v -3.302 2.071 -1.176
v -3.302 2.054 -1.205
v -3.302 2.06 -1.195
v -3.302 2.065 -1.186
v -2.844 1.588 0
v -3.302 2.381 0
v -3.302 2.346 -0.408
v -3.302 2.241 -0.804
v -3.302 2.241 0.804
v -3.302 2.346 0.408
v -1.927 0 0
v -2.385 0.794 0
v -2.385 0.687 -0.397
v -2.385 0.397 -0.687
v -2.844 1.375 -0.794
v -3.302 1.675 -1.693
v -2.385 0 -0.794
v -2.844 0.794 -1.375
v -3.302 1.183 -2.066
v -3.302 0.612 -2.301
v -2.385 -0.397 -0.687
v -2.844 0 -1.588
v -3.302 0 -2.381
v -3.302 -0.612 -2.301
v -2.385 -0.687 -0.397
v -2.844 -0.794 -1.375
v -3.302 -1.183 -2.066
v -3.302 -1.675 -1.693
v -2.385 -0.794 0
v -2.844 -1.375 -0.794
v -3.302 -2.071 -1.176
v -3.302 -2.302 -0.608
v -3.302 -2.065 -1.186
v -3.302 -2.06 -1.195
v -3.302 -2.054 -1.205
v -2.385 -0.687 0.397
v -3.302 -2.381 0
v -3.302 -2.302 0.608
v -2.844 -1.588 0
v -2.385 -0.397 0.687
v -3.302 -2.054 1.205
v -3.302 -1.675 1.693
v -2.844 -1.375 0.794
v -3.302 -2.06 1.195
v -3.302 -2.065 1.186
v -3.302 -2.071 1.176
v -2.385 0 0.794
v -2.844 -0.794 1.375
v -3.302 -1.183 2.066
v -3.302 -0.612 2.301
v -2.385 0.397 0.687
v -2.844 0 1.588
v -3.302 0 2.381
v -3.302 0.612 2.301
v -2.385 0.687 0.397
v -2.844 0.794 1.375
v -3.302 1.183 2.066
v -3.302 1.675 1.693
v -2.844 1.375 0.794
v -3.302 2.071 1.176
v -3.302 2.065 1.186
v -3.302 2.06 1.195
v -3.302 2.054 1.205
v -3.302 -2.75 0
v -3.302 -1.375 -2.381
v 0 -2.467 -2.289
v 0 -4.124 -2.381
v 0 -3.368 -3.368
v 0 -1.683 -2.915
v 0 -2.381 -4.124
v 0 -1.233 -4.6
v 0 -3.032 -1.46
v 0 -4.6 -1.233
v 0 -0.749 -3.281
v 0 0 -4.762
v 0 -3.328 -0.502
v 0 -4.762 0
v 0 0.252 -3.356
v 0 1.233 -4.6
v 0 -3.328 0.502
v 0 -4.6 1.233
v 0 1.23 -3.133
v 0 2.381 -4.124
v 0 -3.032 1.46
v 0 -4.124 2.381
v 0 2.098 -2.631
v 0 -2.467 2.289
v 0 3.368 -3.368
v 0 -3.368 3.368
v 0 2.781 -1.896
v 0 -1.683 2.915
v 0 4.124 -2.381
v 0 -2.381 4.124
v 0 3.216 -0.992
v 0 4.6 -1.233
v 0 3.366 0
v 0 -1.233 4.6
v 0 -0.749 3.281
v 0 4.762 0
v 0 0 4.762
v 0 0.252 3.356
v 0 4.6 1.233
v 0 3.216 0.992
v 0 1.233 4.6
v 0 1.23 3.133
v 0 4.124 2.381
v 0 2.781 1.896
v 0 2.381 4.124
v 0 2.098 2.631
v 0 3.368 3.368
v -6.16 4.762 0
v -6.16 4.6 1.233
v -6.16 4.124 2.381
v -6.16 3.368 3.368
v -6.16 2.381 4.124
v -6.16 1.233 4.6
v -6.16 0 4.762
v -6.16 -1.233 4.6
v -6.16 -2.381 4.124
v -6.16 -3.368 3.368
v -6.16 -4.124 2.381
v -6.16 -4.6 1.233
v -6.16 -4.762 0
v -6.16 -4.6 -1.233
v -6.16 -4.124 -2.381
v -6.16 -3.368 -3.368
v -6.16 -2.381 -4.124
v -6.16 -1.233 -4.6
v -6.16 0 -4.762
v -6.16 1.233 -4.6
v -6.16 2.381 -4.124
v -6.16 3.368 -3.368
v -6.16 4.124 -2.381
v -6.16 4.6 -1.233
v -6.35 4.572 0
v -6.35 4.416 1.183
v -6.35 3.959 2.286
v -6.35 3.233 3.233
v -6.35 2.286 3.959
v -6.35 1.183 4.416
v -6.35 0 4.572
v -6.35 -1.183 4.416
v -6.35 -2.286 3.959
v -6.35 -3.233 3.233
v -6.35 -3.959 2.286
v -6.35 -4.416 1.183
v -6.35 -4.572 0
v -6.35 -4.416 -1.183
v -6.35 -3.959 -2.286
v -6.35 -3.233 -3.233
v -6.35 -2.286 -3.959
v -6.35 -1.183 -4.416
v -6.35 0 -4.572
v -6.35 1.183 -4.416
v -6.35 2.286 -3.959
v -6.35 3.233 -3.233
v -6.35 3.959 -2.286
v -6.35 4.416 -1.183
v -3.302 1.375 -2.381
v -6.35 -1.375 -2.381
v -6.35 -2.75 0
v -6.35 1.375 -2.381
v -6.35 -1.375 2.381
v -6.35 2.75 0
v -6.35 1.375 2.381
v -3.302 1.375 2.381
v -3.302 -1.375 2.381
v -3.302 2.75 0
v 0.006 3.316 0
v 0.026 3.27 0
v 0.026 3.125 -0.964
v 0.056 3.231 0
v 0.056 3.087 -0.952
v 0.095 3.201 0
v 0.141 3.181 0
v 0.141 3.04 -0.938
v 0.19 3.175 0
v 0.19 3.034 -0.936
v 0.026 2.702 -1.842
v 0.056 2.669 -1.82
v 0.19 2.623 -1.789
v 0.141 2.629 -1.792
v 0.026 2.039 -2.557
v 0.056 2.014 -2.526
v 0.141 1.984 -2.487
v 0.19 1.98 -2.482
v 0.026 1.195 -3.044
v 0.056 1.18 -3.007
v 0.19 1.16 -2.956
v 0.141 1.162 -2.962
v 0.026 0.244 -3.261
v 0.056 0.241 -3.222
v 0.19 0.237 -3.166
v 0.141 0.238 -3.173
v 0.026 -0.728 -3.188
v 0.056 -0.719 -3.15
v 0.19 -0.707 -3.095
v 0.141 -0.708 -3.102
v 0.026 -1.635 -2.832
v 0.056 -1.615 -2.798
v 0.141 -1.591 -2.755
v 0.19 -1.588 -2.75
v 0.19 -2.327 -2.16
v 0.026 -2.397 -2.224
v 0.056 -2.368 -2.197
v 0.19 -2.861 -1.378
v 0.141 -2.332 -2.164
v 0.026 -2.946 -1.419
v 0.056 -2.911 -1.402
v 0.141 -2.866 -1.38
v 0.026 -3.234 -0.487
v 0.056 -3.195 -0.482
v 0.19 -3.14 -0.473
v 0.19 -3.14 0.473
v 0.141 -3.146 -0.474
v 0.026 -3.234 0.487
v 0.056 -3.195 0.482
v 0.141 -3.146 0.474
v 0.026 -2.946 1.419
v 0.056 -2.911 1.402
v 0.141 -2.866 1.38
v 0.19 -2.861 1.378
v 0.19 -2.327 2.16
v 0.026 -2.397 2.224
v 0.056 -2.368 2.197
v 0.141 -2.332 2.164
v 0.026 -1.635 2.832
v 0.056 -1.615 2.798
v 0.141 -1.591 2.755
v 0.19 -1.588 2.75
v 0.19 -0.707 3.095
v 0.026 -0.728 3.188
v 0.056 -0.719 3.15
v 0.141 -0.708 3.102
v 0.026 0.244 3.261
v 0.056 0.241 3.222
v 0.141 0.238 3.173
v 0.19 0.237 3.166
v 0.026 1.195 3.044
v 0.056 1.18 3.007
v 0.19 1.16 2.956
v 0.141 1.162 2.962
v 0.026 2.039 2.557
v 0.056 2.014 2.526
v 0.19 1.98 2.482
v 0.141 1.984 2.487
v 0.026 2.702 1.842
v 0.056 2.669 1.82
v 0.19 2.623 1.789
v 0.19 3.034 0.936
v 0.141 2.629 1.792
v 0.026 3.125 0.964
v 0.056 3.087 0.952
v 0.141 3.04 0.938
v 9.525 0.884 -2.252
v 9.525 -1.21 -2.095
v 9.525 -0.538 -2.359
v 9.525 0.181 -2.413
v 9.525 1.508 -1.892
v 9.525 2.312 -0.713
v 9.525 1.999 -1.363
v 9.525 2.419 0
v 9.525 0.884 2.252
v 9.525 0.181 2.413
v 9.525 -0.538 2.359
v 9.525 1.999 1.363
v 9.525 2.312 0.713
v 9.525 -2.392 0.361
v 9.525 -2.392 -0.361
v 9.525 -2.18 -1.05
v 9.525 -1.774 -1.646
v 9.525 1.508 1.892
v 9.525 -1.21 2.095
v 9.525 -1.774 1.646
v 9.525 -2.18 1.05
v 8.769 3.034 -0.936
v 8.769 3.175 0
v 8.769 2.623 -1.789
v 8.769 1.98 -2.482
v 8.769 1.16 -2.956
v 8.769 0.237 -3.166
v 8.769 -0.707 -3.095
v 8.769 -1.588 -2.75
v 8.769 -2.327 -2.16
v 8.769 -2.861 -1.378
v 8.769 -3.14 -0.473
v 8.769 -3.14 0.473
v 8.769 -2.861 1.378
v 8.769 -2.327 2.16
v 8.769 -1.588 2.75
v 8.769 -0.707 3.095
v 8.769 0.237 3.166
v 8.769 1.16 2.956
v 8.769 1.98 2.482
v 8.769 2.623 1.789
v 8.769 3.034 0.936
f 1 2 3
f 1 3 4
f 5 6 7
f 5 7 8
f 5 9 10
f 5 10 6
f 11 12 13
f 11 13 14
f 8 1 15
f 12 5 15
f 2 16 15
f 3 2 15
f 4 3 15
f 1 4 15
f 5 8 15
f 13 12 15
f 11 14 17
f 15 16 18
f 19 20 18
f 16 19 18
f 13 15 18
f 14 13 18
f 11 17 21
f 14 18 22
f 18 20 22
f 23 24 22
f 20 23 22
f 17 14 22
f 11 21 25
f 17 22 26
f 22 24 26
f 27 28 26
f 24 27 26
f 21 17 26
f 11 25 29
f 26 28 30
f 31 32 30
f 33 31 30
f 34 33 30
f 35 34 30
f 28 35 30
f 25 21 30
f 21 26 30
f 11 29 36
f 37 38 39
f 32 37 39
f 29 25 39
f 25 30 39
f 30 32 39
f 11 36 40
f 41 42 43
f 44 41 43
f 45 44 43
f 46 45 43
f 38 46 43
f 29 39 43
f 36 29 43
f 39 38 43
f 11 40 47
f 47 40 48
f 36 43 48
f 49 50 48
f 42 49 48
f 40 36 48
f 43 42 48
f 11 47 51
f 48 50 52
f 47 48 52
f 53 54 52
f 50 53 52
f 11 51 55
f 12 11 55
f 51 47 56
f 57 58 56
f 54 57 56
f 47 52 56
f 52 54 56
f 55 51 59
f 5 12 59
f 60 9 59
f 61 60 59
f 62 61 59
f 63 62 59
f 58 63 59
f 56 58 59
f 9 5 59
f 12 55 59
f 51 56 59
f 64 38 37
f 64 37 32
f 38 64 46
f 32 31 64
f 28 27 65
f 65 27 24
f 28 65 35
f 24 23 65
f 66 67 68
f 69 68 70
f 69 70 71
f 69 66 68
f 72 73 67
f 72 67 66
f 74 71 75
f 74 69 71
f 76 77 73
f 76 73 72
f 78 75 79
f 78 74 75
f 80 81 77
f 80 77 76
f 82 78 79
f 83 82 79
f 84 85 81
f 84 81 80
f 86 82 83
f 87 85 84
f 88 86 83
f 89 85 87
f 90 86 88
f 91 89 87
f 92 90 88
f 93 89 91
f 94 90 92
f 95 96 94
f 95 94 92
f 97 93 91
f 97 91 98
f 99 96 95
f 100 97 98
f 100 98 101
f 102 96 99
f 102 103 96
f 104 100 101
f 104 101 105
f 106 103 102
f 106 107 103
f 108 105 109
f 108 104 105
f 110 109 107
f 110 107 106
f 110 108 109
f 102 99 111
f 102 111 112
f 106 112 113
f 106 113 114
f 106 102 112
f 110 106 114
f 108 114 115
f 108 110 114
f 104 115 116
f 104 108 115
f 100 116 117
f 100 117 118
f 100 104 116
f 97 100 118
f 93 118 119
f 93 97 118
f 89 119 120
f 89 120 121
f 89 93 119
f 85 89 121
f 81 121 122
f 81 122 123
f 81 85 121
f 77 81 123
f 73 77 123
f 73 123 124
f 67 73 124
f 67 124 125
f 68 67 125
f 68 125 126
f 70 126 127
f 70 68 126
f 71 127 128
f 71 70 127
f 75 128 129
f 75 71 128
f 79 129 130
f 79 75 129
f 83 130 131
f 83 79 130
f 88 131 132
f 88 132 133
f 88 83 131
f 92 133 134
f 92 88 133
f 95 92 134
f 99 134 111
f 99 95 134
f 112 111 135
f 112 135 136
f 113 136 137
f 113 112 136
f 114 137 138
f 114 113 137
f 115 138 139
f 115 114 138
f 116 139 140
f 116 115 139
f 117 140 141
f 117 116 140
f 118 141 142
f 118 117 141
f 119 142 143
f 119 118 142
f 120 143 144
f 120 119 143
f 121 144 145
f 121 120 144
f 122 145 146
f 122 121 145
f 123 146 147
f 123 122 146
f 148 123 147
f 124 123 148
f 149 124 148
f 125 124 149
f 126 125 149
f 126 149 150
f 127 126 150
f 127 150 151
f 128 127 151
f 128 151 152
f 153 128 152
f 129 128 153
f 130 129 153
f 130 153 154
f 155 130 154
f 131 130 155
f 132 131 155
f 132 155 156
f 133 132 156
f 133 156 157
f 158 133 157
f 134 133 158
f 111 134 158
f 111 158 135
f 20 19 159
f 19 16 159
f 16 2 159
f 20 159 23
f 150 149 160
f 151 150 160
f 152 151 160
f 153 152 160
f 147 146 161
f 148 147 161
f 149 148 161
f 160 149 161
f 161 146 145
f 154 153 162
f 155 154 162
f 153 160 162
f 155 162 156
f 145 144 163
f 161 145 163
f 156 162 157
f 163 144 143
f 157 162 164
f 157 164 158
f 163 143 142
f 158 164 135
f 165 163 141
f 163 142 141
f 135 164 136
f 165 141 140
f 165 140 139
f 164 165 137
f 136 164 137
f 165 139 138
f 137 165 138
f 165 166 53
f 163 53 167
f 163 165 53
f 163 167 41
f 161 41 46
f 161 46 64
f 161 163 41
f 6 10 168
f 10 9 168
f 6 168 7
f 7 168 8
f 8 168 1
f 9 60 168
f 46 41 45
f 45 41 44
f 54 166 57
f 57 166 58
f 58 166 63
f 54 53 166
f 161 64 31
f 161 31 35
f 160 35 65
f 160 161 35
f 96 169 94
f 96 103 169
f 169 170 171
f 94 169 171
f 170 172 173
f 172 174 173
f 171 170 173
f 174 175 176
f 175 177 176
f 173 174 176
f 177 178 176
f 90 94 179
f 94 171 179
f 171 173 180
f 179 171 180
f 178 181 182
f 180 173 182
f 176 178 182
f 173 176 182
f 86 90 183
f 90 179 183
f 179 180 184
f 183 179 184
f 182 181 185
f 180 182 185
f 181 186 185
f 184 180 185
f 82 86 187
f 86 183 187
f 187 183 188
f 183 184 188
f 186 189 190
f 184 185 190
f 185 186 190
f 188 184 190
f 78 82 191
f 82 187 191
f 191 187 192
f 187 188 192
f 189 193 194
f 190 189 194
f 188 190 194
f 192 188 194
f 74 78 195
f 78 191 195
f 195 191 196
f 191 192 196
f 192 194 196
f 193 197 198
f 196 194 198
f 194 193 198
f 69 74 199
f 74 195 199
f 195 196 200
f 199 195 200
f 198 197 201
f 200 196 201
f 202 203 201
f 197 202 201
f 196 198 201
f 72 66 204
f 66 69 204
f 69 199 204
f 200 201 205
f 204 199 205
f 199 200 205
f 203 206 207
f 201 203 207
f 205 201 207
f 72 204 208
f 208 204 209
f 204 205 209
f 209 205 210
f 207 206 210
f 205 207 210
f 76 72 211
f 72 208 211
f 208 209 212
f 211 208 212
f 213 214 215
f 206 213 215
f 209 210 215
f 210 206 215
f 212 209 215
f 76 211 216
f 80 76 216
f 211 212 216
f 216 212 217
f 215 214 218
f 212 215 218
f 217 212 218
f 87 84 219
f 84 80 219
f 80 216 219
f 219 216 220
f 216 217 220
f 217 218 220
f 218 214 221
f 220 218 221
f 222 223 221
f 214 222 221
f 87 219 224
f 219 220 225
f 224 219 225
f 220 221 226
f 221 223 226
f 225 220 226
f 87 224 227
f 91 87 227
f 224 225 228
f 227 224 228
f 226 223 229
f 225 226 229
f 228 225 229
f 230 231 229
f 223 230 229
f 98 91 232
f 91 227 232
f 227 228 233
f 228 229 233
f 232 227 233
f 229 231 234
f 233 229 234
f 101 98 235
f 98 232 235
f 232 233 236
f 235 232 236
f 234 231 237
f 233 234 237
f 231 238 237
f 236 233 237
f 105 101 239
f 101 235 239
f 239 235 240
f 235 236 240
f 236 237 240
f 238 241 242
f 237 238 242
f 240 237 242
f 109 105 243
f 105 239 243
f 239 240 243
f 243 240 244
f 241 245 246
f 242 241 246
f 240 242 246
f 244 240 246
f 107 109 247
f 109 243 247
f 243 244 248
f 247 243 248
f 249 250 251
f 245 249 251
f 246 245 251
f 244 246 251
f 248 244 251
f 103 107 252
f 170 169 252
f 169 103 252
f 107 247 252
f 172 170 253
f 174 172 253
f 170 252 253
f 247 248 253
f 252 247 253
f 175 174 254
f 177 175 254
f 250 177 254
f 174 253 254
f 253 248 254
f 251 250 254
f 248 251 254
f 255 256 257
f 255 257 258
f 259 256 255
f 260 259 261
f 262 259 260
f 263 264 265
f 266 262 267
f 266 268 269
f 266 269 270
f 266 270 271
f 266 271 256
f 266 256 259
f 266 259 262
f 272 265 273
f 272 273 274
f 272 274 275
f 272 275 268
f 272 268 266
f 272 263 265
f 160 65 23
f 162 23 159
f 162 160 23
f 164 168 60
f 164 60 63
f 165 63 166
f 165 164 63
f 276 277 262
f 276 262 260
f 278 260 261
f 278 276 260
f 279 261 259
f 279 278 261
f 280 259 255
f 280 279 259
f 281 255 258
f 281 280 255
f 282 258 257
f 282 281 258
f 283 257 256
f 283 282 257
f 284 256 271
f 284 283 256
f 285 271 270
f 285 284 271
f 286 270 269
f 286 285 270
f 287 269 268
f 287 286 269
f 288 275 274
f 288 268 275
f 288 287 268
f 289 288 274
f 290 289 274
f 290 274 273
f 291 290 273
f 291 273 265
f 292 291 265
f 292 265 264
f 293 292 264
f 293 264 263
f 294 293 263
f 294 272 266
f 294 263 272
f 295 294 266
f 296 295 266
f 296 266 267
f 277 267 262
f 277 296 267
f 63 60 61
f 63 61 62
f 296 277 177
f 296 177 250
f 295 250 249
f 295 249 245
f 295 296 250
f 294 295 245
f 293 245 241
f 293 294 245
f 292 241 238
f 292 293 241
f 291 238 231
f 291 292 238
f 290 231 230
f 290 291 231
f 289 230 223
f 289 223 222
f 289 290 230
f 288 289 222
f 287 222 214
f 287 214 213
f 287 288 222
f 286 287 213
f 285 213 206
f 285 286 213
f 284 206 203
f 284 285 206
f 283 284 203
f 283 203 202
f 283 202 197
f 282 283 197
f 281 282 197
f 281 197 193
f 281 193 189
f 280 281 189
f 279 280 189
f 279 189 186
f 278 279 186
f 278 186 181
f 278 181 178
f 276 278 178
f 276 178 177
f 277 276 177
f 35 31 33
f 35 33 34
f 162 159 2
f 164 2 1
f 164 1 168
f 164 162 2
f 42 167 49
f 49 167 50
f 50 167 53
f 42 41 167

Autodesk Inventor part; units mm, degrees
sketch "Sketch_1" plane through (0, 0, 0) normal (0, 0, 1) x (1, 0, 0)
  line L0 (9.525, 0) -> (-6.35, 0)
  line L1 (-6.35, 0) -> (-6.35, 4.572)
  line L2 (-6.35, 4.572) -> (-6.1595, 4.7625)
  line L3 (-6.1595, 4.7625) -> (0, 4.7625)
  line L4 (0, 4.7625) -> (0, 3.3655)
  arc A0 (0, 3.3655) -> (0.1905, 3.175) centre (0.1905, 3.3655) ccw
  line L5 (0.1905, 3.175) -> (8.7693, 3.175)
  line L6 (8.7693, 3.175) -> (9.525, 2.4194)
  line L7 (9.525, 2.4194) -> (9.525, 0)
  line L8 (9.525, 0) -> (-6.35, 0)
revolve "Revolution1" add sketch "Sketch_1" angle 360 about axis through (9.525, 0, 0) along (1, 0, 0)
thread "Thread1" size "1/4-20 UNC" class "2A" standard "ANSI Unified Screw Threads" length 6.3881
sketch "Sketch_3" plane through (-6.35, 0, 0) normal (1, 0, 0) x (0, 0, -1)
  line L0 (-2.3813, -1.3748) -> (0, -2.7496)
  line L1 (0, -2.7496) -> (2.3813, -1.3748)
  line L2 (2.3813, -1.3748) -> (2.3813, 1.3748)
  line L3 (2.3813, 1.3748) -> (0, 2.7496)
  line L4 (0, 2.7496) -> (-2.3813, 1.3748)
  line L5 (-2.3813, 1.3748) -> (-2.3813, -1.3748)
extrude "Extrusion1" cut sketch "Sketch_3" along normal blind 3.048
sketch "Sketch_4" plane through (0, 0, 0) normal (0, 0, 1) x (1, 0, 0)
  line L0 (-1.9272, 0) -> (-3.302, 0)
  line L1 (-3.302, 0) -> (-3.302, 2.3813)
  line L2 (-3.302, 2.3813) -> (-1.9272, 0)
  line L3 (-1.9272, 0) -> (-3.302, 0)
revolve "Revolution2" cut sketch "Sketch_4" angle 360 about axis through (-1.9272, 0, 0) along (1, 0, 0)
ref_plane "screw_XY" through (0, 0, 0) normal (1, 0, 0) x (0, 0, -1)
ref_plane "screw_YZ" through (0, 0, 0) normal (0, 0, -1) x (0, 1, 0)
ref_plane "screw_ZX" through (0, 0, 0) normal (0, 1, 0) x (1, 0, 0)
ref_plane "screw1_XY" through (9.525, 0, 0) normal (1, 0, 0) x (0, 0, -1)
ref_plane "screw1_YZ" through (9.525, 0, 0) normal (0, 0, -1) x (0, 1, 0)
ref_plane "screw1_ZX" through (9.525, 0, 0) normal (0, 1, 0) x (1, 0, 0)
ref_plane "screw2_XY" through (4.445, 0, 0) normal (1, 0, 0) x (0, 0, -1)
ref_plane "screw2_YZ" through (4.445, 0, 0) normal (0, 0, -1) x (0, 1, 0)
ref_plane "screw2_ZX" through (4.445, 0, 0) normal (0, 1, 0) x (1, 0, 0)
ref_plane "to_tnut_XY" through (7.366, 0, 0) normal (1, 0, 0) x (0, 0, -1)
ref_plane "to_tnut_YZ" through (7.366, 0, 0) normal (0, 0, -1) x (0, 1, 0)
ref_plane "to_tnut_ZX" through (7.366, 0, 0) normal (0, 1, 0) x (1, 0, 0)
properties part number "3058"
